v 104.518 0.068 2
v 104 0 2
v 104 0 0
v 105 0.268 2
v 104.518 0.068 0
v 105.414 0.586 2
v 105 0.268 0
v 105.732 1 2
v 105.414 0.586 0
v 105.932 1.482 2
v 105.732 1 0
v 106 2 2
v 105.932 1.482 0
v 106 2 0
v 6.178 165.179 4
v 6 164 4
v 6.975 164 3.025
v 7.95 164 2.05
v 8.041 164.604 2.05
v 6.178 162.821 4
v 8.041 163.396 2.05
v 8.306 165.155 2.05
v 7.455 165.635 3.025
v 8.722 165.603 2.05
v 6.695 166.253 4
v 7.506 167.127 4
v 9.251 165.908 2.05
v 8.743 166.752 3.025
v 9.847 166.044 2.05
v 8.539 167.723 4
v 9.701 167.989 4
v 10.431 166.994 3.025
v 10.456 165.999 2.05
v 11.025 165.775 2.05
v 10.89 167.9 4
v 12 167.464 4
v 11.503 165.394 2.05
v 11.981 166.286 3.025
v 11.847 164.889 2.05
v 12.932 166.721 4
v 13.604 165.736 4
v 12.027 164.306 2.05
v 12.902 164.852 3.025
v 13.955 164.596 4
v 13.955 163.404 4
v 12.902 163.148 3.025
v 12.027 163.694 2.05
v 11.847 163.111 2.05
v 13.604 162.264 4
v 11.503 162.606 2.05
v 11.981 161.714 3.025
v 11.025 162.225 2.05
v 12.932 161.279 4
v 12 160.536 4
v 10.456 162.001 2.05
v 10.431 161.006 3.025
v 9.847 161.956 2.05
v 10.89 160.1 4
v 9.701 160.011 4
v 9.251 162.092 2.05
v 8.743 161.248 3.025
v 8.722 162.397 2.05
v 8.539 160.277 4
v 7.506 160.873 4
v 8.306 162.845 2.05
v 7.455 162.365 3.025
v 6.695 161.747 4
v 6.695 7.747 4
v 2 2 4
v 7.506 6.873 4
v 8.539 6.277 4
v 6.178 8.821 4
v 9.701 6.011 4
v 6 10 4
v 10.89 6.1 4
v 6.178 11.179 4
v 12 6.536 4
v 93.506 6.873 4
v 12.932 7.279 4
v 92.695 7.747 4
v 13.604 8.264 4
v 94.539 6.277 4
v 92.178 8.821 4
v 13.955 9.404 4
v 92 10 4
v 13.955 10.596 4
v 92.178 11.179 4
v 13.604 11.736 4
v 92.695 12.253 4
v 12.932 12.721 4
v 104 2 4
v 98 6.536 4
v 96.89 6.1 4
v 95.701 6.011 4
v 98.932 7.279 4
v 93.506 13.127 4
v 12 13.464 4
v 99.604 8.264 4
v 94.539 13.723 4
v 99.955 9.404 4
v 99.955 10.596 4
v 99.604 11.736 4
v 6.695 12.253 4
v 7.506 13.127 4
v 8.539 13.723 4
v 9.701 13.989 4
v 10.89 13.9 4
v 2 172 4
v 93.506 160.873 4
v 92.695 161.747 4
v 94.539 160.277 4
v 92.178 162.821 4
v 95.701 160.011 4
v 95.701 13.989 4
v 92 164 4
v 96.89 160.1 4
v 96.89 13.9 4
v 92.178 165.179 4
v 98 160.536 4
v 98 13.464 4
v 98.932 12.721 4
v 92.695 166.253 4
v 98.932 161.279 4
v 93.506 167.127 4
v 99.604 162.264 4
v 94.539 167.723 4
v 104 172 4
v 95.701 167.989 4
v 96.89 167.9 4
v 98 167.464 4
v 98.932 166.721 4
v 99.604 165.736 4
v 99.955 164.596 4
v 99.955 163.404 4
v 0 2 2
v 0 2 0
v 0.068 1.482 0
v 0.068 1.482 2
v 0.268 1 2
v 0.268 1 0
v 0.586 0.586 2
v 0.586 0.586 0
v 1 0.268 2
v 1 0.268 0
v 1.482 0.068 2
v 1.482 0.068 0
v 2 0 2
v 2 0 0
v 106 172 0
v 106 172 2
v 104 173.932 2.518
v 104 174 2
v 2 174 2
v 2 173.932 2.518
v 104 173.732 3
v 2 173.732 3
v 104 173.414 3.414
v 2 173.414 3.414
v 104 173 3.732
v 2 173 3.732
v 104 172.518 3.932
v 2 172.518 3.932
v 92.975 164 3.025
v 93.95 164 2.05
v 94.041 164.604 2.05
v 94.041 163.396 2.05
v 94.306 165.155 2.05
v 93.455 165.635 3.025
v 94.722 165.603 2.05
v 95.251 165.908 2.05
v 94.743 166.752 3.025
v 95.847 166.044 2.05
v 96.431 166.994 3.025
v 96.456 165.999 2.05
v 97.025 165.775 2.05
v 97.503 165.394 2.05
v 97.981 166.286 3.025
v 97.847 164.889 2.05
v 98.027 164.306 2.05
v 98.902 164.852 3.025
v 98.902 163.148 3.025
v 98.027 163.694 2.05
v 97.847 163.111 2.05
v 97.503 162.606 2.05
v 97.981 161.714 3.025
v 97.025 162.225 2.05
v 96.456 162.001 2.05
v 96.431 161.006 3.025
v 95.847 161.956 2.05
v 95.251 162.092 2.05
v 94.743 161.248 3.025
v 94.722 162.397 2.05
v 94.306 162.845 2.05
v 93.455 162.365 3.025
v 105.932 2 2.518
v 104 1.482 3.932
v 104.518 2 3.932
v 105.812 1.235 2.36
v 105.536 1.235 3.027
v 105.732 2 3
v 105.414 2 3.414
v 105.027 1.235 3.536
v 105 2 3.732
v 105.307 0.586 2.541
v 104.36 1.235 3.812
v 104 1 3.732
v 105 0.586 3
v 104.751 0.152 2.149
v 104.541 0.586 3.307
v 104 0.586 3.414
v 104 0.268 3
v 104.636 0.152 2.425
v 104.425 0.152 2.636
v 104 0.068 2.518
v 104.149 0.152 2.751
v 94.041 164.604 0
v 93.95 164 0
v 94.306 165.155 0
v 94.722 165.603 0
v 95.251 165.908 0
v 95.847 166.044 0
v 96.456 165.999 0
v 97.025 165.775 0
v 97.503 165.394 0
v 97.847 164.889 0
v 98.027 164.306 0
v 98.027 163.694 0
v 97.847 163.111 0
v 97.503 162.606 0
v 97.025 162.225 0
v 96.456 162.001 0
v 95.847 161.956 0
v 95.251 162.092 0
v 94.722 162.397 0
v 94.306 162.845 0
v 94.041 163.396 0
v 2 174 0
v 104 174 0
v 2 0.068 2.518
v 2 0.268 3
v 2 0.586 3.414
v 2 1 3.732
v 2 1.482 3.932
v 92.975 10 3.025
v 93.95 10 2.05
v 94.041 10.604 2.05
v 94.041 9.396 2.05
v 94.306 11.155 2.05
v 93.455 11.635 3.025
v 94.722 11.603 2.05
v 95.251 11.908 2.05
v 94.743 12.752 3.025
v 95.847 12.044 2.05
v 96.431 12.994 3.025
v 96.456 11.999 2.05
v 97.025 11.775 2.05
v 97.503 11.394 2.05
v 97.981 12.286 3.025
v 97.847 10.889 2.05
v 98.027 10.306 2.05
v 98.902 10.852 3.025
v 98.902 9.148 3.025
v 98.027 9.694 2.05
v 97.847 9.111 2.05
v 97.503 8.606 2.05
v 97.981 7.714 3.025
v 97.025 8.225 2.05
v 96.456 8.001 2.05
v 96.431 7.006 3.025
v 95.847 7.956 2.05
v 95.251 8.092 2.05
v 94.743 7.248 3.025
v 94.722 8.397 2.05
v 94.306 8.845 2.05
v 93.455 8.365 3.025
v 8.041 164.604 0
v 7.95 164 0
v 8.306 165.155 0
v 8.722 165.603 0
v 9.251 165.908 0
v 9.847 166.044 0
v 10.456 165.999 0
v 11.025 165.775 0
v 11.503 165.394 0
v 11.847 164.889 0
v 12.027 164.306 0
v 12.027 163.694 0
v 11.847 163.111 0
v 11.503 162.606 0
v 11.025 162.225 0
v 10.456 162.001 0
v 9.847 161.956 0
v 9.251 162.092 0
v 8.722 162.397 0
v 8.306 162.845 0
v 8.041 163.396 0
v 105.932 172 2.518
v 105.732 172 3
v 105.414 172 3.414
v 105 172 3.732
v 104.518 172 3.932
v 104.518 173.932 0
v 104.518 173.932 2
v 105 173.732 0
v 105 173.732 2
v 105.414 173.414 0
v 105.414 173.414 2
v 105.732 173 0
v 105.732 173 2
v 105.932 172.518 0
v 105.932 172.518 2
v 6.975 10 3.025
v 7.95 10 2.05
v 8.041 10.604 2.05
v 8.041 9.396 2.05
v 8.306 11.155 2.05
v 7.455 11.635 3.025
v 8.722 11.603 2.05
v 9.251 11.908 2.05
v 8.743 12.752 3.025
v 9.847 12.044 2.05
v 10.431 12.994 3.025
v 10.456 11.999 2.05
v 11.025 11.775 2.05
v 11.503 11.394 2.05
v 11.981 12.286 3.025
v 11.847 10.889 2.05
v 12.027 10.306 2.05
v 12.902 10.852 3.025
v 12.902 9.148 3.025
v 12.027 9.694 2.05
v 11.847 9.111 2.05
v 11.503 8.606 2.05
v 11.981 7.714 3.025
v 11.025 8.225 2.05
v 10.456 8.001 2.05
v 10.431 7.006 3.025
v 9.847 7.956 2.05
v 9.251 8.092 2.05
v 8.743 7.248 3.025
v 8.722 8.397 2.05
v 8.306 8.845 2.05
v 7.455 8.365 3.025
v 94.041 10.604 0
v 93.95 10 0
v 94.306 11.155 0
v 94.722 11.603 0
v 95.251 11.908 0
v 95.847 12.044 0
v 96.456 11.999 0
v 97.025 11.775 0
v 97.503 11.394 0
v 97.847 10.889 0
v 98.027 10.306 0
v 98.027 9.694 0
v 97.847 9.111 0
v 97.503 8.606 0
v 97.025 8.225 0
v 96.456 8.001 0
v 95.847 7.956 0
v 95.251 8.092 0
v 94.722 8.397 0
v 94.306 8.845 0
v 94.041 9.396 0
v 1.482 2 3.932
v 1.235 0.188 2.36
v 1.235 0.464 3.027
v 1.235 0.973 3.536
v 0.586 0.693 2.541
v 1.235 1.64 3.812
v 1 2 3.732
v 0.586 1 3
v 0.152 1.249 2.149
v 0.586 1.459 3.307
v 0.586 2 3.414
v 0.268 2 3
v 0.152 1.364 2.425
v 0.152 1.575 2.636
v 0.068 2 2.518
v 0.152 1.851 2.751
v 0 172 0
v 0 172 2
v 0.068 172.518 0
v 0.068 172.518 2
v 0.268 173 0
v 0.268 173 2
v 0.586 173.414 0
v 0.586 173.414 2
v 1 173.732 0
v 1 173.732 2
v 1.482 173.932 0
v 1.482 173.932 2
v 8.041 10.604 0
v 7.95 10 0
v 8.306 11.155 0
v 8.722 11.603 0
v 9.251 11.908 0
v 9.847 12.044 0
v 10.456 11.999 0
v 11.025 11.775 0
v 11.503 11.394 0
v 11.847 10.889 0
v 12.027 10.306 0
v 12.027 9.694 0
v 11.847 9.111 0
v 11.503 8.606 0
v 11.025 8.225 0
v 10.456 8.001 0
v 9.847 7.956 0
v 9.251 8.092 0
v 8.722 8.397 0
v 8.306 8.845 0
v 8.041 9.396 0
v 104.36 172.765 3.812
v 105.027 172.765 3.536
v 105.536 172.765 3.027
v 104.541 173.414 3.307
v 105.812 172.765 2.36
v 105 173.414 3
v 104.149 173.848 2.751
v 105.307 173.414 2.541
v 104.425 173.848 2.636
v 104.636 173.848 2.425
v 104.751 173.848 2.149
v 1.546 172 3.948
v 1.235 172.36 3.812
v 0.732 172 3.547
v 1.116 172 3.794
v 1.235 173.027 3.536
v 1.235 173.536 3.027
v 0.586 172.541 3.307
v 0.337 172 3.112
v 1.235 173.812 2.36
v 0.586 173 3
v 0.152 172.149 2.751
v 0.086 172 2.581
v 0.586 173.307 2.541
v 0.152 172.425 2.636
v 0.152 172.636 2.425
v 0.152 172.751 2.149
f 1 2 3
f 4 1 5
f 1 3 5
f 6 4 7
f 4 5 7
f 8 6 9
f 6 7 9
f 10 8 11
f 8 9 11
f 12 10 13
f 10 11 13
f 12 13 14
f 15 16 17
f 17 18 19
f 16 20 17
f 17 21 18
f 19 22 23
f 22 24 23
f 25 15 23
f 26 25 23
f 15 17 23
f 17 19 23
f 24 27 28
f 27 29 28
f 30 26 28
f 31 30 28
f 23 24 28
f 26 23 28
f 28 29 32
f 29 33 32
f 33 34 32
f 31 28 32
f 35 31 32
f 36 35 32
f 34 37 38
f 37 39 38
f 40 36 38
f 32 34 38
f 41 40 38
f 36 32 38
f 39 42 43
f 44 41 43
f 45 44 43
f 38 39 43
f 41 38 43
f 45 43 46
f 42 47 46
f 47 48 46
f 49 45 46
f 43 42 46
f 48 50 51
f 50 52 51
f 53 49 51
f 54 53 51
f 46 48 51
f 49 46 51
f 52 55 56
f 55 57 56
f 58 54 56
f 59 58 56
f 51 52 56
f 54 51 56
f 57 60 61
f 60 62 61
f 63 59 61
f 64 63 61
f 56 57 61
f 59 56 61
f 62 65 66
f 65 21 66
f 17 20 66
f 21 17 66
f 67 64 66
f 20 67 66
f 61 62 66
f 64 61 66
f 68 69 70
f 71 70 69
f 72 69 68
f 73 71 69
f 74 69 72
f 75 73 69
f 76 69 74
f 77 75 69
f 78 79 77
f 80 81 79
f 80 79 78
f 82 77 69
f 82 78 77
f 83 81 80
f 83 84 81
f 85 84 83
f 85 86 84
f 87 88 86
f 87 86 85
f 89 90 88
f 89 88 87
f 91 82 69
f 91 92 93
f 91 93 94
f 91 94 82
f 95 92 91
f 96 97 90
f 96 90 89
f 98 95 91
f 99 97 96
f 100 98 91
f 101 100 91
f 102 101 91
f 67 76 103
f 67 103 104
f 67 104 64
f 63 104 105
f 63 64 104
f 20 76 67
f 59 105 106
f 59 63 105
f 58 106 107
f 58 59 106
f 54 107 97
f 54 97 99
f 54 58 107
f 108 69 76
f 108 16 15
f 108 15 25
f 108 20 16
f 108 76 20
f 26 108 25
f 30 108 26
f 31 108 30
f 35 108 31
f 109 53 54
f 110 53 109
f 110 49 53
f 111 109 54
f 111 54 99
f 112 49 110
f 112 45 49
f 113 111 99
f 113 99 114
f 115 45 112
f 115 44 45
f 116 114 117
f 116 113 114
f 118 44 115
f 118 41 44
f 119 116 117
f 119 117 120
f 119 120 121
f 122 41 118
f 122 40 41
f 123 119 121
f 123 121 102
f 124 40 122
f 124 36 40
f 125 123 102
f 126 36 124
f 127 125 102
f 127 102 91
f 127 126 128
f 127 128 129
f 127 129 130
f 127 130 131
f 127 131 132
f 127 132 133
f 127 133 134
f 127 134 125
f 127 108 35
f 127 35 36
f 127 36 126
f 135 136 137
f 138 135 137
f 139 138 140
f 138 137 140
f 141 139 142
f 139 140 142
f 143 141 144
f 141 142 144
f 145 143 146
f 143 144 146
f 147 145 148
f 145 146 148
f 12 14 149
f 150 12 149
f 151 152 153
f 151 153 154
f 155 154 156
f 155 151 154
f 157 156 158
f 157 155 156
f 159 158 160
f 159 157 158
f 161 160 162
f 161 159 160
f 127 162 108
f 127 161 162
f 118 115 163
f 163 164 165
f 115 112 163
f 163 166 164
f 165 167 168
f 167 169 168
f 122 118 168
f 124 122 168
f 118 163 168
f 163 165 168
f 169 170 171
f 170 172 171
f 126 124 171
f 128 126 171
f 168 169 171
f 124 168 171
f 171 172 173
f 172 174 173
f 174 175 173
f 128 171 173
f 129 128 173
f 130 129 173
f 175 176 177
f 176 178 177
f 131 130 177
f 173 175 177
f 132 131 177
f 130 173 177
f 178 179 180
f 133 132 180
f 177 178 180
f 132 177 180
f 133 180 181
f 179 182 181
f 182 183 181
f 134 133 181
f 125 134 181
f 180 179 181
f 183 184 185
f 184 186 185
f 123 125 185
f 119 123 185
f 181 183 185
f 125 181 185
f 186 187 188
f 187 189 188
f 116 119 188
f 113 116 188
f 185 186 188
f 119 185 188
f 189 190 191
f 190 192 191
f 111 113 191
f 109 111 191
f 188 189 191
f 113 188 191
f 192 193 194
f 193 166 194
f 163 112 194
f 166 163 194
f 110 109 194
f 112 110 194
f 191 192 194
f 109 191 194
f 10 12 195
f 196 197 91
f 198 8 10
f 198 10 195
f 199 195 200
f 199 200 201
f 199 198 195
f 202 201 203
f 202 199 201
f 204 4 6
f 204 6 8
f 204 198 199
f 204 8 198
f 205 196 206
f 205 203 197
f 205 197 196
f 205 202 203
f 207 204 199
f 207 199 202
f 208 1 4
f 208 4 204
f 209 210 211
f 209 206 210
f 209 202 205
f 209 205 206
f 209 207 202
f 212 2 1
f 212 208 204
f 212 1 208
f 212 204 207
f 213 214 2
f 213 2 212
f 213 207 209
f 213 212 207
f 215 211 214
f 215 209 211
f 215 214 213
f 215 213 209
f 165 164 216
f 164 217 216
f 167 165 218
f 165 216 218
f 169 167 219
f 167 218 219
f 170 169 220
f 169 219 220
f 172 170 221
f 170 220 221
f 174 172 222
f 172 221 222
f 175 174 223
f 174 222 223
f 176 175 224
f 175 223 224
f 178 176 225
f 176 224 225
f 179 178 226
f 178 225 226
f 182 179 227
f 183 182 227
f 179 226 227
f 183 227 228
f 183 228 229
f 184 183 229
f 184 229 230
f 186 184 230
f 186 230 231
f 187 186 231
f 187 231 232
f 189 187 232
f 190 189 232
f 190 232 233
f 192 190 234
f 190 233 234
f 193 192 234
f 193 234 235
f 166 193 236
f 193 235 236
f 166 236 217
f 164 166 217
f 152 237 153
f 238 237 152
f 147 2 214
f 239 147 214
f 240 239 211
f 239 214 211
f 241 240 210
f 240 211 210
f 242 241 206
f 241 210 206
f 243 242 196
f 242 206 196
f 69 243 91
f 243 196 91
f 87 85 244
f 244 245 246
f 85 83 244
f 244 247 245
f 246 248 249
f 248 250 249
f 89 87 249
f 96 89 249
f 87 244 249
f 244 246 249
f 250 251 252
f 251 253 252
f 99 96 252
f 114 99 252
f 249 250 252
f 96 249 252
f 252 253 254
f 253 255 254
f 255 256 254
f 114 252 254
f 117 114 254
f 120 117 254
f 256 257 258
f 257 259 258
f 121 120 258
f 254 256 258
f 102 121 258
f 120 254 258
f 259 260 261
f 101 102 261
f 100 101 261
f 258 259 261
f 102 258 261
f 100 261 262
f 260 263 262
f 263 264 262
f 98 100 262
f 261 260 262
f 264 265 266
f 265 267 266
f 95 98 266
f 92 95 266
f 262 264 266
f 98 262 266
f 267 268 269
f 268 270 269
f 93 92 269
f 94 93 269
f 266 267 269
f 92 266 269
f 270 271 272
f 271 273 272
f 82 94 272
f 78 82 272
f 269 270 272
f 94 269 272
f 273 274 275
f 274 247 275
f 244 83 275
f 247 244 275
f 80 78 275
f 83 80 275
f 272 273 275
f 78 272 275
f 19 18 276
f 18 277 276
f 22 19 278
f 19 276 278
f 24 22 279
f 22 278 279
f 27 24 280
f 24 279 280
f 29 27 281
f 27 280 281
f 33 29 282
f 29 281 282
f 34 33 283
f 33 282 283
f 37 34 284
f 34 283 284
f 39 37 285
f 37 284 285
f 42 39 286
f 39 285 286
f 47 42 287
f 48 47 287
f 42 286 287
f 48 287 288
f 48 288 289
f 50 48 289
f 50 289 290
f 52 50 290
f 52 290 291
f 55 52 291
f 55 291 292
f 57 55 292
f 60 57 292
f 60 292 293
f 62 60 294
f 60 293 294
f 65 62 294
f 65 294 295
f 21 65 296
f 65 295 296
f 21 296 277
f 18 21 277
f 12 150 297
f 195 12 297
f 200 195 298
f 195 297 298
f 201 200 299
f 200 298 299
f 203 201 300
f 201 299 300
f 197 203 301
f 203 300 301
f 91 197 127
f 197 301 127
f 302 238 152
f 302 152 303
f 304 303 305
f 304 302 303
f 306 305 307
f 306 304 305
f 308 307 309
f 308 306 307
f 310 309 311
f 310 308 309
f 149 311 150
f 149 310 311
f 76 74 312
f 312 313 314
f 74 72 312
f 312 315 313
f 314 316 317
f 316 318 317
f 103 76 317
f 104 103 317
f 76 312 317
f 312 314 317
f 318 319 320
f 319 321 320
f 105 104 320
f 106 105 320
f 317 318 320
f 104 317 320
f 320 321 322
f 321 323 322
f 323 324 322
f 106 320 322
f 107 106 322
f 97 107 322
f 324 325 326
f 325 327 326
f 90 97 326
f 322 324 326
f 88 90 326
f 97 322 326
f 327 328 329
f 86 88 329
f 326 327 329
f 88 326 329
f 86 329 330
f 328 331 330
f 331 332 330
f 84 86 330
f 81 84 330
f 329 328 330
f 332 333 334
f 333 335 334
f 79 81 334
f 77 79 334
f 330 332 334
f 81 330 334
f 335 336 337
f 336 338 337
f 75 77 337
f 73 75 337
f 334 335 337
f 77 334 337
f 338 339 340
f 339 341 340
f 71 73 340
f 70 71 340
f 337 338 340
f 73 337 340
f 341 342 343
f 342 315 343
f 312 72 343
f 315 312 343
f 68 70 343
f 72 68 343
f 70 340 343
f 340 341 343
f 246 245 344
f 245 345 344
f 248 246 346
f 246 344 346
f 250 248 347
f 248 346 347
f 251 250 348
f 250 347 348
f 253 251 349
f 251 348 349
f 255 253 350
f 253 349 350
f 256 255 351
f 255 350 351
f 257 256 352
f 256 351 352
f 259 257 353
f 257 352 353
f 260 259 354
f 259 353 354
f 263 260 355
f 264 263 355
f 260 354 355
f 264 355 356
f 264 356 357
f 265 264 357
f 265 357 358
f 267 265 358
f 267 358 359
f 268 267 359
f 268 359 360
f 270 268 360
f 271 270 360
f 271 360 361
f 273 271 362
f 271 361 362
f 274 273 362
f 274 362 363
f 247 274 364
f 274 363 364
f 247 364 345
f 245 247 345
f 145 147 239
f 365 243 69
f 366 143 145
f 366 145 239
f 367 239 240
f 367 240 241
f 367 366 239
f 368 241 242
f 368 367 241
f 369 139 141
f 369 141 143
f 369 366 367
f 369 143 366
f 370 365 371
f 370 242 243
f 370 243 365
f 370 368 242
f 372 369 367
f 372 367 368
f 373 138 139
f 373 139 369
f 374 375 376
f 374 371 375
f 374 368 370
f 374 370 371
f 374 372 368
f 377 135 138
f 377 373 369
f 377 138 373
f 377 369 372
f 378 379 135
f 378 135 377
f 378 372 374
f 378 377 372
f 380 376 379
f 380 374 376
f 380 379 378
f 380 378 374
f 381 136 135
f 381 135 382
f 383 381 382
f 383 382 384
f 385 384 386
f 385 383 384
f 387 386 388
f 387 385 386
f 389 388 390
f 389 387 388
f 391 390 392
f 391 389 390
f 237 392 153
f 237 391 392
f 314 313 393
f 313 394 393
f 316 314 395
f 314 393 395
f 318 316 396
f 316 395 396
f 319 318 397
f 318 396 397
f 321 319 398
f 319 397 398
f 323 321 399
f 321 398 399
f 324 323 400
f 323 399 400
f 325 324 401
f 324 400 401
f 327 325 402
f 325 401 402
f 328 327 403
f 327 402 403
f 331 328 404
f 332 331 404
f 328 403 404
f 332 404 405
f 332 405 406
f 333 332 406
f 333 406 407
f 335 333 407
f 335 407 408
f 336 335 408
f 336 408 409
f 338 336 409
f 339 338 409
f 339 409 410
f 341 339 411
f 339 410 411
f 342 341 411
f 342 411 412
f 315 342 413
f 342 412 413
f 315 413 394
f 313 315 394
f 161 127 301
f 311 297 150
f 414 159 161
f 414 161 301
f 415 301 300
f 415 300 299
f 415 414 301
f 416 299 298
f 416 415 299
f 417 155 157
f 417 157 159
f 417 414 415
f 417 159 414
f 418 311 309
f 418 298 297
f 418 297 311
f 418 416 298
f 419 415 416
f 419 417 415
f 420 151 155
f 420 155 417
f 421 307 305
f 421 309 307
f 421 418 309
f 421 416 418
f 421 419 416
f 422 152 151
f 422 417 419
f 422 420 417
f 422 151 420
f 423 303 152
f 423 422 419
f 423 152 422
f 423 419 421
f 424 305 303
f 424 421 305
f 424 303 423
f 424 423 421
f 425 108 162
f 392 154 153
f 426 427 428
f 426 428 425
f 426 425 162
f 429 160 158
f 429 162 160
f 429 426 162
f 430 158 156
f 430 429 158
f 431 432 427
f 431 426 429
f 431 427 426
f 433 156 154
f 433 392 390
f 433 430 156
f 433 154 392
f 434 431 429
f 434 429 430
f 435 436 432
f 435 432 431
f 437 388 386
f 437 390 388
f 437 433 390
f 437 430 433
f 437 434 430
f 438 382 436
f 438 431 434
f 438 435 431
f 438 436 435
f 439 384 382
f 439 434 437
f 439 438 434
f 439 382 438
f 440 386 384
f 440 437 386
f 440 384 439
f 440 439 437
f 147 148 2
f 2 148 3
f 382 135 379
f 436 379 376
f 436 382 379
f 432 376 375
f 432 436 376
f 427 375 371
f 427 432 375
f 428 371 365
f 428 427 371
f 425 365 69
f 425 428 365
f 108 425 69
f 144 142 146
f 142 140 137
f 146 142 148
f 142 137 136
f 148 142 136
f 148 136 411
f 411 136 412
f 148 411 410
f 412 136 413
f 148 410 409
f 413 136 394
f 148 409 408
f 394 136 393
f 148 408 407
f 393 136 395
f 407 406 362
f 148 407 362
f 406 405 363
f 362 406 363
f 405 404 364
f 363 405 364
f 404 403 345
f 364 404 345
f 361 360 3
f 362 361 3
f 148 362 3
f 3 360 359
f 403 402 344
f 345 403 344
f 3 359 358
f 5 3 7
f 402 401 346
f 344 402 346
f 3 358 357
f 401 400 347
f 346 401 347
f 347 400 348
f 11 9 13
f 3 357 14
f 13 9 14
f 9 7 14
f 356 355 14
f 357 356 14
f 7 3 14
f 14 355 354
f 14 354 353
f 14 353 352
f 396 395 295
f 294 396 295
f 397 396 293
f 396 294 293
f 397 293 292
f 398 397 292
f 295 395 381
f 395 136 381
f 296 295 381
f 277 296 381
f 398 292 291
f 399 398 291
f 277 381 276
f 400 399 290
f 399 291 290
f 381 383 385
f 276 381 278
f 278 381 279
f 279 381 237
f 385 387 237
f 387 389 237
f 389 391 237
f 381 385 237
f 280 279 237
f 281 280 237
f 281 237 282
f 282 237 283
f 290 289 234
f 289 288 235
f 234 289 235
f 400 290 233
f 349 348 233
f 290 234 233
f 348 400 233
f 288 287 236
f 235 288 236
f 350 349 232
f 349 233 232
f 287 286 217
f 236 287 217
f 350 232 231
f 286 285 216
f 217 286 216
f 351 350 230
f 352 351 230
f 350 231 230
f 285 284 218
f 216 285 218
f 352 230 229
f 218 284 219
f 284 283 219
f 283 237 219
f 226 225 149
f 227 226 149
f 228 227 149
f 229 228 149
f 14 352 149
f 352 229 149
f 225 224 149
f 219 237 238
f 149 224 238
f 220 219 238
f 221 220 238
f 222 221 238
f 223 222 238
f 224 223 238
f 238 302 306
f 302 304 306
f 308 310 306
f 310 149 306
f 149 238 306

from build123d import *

# Parameters (mm, degrees)
F0_W           = 106
F0_H           = 174
F1_DEPTH       = 4
F2_R           = 2
F3_T1_DEPTH    = 7
F3_S5_W        = 2
F3_S5_H        = 2
F3_T6_DEPTH    = 2
F3_S11_W       = 2
F3_S11_H       = 2
F3_T12_DEPTH   = 2
F3_S17_W       = 2
F3_S17_H       = 2
F3_T18_DEPTH   = 2
F3_S23_W       = 2
F3_S23_H       = 2
F3_T24_DEPTH   = 2
F5_D           = 4.1
F5_DEPTH       = 40
F5_CSINK_D     = 8
F5_CSINK_ANGLE = 90
F5_TIP         = 1.231764269


# Not quite as in the source:
# - a fillet or chamfer that OpenCascade refuses, or shapes differently, is made with other operations: its cross-section is extruded or revolved along the edge and cut away or added


with BuildPart() as f1:
    # F0 (on Top) → F1 (new body)
    with BuildSketch(Plane.XY):
        with Locations((53, 87)):
            Rectangle(F0_W, F0_H)
    extrude(amount=F1_DEPTH)

    # F2
    f2_edges = [f1.edges().sort_by_distance(p)[0] for p in [
        (53, 0, 4),
        (0, 87, 4),
        (106, 87, 4),
        (53, 174, 4),
    ]]
    fillet(f2_edges, radius=F2_R)

    # F3: fillet of radius 2 on 4 edges, made by hand

    # F3_s2 → F3_t1 (cut)
    with BuildSketch(Plane.XY.offset(-5)):
        with BuildLine():
            ThreePointArc((104, 0), (105.4142135624, 0.5857864376), (106, 2))
            Line((106, 2), (106, 0))
            Line((106, 0), (104, 0))
        make_face()
        with BuildLine():
            ThreePointArc((0, 2), (0.5857864376, 0.5857864376), (2, 0))
            Line((2, 0), (0, 0))
            Line((0, 0), (0, 2))
        make_face()
        with BuildLine():
            ThreePointArc((0, 172), (0.5857864376, 173.4142135624), (2, 174))
            Line((2, 174), (0, 174))
            Line((0, 174), (0, 172))
        make_face()
        with BuildLine():
            ThreePointArc((104, 174), (105.4142135624, 173.4142135624), (106, 172))
            Line((106, 172), (106, 174))
            Line((106, 174), (104, 174))
        make_face()
    extrude(amount=F3_T1_DEPTH, mode=Mode.SUBTRACT)


with BuildPart() as f3_tool4:
    # F3_s5 → F3_t6 (new body)
    with BuildSketch(Plane.XZ.offset(-172)):
        with Locations((105, 3)):
            Rectangle(F3_S5_W, F3_S5_H)
    extrude(amount=-F3_T6_DEPTH)

    # F3_s7 → F3_t8 (revolve, cut)
    with BuildSketch(Plane(origin=(104, 172, 2), x_dir=(-0.7071067812, 0, -0.7071067812), z_dir=(0.7071067812, 0, -0.7071067812))):
        with BuildLine():
            ThreePointArc((0, -2), (2, 0), (0, 2))
            Line((0, 2), (0, -2))
        make_face()
    revolve(axis=Axis((104, 172, 2), (0, 1, 0)), mode=Mode.SUBTRACT)


with BuildPart() as f1_1:
    add(f1.part)

    # F3_t3: cut F3_tool4
    add(f3_tool4.part, mode=Mode.SUBTRACT)


with BuildPart() as f3_tool10:
    # F3_s11 → F3_t12 (new body)
    with BuildSketch(Plane.YZ.offset(2)):
        with Locations((173, 3)):
            Rectangle(F3_S11_W, F3_S11_H)
    extrude(amount=-F3_T12_DEPTH)

    # F3_s13 → F3_t14 (revolve, cut)
    with BuildSketch(Plane(origin=(2, 172, 2), x_dir=(0, -0.7071067812, -0.7071067812), z_dir=(0, 0.7071067812, -0.7071067812))):
        with BuildLine():
            ThreePointArc((0, -2), (2, 0), (0, 2))
            Line((0, 2), (0, -2))
        make_face()
    revolve(axis=Axis((2, 172, 2), (-1, 0, 0)), mode=Mode.SUBTRACT)


with BuildPart() as f1_2:
    add(f1_1.part)

    # F3_t9: cut F3_tool10
    add(f3_tool10.part, mode=Mode.SUBTRACT)


with BuildPart() as f3_tool16:
    # F3_s17 → F3_t18 (new body)
    with BuildSketch(Plane.YZ.offset(2)):
        with Locations((1, 3)):
            Rectangle(F3_S17_W, F3_S17_H)
    extrude(amount=-F3_T18_DEPTH)

    # F3_s19 → F3_t20 (revolve, cut)
    with BuildSketch(Plane(origin=(2, 2, 2), x_dir=(0, 0.7071067812, -0.7071067812), z_dir=(0, 0.7071067812, 0.7071067812))):
        with BuildLine():
            ThreePointArc((0, -2), (2, 0), (0, 2))
            Line((0, 2), (0, -2))
        make_face()
    revolve(axis=Axis((2, 2, 2), (-1, 0, 0)), mode=Mode.SUBTRACT)


with BuildPart() as f1_3:
    add(f1_2.part)

    # F3_t15: cut F3_tool16
    add(f3_tool16.part, mode=Mode.SUBTRACT)


with BuildPart() as f3_tool22:
    # F3_s23 → F3_t24 (new body)
    with BuildSketch(Plane.XZ.offset(-2)):
        with Locations((105, 3)):
            Rectangle(F3_S23_W, F3_S23_H)
    extrude(amount=F3_T24_DEPTH)

    # F3_s25 → F3_t26 (revolve, cut)
    with BuildSketch(Plane(origin=(104, 2, 2), x_dir=(-0.7071067812, 0, -0.7071067812), z_dir=(-0.7071067812, 0, 0.7071067812))):
        with BuildLine():
            ThreePointArc((0, -2), (2, 0), (0, 2))
            Line((0, 2), (0, -2))
        make_face()
    revolve(axis=Axis((104, 2, 2), (0, -1, 0)), mode=Mode.SUBTRACT)


with BuildPart() as f1_4:
    add(f1_3.part)

    # F3_t21: cut F3_tool22
    add(f3_tool22.part, mode=Mode.SUBTRACT)

    # F5
    with Locations(Plane.XY.offset(4)):
        with Locations((10, 164), (10, 10), (96, 164), (96, 10)):
            CounterSinkHole(F5_D / 2, F5_CSINK_D / 2, depth=F5_DEPTH, counter_sink_angle=F5_CSINK_ANGLE)
            with Locations((0, 0, -(F5_DEPTH + F5_TIP / 2))):  # 118° drill point
                Cone(0, F5_D / 2, F5_TIP, mode=Mode.SUBTRACT)


solid = f1_4.part
